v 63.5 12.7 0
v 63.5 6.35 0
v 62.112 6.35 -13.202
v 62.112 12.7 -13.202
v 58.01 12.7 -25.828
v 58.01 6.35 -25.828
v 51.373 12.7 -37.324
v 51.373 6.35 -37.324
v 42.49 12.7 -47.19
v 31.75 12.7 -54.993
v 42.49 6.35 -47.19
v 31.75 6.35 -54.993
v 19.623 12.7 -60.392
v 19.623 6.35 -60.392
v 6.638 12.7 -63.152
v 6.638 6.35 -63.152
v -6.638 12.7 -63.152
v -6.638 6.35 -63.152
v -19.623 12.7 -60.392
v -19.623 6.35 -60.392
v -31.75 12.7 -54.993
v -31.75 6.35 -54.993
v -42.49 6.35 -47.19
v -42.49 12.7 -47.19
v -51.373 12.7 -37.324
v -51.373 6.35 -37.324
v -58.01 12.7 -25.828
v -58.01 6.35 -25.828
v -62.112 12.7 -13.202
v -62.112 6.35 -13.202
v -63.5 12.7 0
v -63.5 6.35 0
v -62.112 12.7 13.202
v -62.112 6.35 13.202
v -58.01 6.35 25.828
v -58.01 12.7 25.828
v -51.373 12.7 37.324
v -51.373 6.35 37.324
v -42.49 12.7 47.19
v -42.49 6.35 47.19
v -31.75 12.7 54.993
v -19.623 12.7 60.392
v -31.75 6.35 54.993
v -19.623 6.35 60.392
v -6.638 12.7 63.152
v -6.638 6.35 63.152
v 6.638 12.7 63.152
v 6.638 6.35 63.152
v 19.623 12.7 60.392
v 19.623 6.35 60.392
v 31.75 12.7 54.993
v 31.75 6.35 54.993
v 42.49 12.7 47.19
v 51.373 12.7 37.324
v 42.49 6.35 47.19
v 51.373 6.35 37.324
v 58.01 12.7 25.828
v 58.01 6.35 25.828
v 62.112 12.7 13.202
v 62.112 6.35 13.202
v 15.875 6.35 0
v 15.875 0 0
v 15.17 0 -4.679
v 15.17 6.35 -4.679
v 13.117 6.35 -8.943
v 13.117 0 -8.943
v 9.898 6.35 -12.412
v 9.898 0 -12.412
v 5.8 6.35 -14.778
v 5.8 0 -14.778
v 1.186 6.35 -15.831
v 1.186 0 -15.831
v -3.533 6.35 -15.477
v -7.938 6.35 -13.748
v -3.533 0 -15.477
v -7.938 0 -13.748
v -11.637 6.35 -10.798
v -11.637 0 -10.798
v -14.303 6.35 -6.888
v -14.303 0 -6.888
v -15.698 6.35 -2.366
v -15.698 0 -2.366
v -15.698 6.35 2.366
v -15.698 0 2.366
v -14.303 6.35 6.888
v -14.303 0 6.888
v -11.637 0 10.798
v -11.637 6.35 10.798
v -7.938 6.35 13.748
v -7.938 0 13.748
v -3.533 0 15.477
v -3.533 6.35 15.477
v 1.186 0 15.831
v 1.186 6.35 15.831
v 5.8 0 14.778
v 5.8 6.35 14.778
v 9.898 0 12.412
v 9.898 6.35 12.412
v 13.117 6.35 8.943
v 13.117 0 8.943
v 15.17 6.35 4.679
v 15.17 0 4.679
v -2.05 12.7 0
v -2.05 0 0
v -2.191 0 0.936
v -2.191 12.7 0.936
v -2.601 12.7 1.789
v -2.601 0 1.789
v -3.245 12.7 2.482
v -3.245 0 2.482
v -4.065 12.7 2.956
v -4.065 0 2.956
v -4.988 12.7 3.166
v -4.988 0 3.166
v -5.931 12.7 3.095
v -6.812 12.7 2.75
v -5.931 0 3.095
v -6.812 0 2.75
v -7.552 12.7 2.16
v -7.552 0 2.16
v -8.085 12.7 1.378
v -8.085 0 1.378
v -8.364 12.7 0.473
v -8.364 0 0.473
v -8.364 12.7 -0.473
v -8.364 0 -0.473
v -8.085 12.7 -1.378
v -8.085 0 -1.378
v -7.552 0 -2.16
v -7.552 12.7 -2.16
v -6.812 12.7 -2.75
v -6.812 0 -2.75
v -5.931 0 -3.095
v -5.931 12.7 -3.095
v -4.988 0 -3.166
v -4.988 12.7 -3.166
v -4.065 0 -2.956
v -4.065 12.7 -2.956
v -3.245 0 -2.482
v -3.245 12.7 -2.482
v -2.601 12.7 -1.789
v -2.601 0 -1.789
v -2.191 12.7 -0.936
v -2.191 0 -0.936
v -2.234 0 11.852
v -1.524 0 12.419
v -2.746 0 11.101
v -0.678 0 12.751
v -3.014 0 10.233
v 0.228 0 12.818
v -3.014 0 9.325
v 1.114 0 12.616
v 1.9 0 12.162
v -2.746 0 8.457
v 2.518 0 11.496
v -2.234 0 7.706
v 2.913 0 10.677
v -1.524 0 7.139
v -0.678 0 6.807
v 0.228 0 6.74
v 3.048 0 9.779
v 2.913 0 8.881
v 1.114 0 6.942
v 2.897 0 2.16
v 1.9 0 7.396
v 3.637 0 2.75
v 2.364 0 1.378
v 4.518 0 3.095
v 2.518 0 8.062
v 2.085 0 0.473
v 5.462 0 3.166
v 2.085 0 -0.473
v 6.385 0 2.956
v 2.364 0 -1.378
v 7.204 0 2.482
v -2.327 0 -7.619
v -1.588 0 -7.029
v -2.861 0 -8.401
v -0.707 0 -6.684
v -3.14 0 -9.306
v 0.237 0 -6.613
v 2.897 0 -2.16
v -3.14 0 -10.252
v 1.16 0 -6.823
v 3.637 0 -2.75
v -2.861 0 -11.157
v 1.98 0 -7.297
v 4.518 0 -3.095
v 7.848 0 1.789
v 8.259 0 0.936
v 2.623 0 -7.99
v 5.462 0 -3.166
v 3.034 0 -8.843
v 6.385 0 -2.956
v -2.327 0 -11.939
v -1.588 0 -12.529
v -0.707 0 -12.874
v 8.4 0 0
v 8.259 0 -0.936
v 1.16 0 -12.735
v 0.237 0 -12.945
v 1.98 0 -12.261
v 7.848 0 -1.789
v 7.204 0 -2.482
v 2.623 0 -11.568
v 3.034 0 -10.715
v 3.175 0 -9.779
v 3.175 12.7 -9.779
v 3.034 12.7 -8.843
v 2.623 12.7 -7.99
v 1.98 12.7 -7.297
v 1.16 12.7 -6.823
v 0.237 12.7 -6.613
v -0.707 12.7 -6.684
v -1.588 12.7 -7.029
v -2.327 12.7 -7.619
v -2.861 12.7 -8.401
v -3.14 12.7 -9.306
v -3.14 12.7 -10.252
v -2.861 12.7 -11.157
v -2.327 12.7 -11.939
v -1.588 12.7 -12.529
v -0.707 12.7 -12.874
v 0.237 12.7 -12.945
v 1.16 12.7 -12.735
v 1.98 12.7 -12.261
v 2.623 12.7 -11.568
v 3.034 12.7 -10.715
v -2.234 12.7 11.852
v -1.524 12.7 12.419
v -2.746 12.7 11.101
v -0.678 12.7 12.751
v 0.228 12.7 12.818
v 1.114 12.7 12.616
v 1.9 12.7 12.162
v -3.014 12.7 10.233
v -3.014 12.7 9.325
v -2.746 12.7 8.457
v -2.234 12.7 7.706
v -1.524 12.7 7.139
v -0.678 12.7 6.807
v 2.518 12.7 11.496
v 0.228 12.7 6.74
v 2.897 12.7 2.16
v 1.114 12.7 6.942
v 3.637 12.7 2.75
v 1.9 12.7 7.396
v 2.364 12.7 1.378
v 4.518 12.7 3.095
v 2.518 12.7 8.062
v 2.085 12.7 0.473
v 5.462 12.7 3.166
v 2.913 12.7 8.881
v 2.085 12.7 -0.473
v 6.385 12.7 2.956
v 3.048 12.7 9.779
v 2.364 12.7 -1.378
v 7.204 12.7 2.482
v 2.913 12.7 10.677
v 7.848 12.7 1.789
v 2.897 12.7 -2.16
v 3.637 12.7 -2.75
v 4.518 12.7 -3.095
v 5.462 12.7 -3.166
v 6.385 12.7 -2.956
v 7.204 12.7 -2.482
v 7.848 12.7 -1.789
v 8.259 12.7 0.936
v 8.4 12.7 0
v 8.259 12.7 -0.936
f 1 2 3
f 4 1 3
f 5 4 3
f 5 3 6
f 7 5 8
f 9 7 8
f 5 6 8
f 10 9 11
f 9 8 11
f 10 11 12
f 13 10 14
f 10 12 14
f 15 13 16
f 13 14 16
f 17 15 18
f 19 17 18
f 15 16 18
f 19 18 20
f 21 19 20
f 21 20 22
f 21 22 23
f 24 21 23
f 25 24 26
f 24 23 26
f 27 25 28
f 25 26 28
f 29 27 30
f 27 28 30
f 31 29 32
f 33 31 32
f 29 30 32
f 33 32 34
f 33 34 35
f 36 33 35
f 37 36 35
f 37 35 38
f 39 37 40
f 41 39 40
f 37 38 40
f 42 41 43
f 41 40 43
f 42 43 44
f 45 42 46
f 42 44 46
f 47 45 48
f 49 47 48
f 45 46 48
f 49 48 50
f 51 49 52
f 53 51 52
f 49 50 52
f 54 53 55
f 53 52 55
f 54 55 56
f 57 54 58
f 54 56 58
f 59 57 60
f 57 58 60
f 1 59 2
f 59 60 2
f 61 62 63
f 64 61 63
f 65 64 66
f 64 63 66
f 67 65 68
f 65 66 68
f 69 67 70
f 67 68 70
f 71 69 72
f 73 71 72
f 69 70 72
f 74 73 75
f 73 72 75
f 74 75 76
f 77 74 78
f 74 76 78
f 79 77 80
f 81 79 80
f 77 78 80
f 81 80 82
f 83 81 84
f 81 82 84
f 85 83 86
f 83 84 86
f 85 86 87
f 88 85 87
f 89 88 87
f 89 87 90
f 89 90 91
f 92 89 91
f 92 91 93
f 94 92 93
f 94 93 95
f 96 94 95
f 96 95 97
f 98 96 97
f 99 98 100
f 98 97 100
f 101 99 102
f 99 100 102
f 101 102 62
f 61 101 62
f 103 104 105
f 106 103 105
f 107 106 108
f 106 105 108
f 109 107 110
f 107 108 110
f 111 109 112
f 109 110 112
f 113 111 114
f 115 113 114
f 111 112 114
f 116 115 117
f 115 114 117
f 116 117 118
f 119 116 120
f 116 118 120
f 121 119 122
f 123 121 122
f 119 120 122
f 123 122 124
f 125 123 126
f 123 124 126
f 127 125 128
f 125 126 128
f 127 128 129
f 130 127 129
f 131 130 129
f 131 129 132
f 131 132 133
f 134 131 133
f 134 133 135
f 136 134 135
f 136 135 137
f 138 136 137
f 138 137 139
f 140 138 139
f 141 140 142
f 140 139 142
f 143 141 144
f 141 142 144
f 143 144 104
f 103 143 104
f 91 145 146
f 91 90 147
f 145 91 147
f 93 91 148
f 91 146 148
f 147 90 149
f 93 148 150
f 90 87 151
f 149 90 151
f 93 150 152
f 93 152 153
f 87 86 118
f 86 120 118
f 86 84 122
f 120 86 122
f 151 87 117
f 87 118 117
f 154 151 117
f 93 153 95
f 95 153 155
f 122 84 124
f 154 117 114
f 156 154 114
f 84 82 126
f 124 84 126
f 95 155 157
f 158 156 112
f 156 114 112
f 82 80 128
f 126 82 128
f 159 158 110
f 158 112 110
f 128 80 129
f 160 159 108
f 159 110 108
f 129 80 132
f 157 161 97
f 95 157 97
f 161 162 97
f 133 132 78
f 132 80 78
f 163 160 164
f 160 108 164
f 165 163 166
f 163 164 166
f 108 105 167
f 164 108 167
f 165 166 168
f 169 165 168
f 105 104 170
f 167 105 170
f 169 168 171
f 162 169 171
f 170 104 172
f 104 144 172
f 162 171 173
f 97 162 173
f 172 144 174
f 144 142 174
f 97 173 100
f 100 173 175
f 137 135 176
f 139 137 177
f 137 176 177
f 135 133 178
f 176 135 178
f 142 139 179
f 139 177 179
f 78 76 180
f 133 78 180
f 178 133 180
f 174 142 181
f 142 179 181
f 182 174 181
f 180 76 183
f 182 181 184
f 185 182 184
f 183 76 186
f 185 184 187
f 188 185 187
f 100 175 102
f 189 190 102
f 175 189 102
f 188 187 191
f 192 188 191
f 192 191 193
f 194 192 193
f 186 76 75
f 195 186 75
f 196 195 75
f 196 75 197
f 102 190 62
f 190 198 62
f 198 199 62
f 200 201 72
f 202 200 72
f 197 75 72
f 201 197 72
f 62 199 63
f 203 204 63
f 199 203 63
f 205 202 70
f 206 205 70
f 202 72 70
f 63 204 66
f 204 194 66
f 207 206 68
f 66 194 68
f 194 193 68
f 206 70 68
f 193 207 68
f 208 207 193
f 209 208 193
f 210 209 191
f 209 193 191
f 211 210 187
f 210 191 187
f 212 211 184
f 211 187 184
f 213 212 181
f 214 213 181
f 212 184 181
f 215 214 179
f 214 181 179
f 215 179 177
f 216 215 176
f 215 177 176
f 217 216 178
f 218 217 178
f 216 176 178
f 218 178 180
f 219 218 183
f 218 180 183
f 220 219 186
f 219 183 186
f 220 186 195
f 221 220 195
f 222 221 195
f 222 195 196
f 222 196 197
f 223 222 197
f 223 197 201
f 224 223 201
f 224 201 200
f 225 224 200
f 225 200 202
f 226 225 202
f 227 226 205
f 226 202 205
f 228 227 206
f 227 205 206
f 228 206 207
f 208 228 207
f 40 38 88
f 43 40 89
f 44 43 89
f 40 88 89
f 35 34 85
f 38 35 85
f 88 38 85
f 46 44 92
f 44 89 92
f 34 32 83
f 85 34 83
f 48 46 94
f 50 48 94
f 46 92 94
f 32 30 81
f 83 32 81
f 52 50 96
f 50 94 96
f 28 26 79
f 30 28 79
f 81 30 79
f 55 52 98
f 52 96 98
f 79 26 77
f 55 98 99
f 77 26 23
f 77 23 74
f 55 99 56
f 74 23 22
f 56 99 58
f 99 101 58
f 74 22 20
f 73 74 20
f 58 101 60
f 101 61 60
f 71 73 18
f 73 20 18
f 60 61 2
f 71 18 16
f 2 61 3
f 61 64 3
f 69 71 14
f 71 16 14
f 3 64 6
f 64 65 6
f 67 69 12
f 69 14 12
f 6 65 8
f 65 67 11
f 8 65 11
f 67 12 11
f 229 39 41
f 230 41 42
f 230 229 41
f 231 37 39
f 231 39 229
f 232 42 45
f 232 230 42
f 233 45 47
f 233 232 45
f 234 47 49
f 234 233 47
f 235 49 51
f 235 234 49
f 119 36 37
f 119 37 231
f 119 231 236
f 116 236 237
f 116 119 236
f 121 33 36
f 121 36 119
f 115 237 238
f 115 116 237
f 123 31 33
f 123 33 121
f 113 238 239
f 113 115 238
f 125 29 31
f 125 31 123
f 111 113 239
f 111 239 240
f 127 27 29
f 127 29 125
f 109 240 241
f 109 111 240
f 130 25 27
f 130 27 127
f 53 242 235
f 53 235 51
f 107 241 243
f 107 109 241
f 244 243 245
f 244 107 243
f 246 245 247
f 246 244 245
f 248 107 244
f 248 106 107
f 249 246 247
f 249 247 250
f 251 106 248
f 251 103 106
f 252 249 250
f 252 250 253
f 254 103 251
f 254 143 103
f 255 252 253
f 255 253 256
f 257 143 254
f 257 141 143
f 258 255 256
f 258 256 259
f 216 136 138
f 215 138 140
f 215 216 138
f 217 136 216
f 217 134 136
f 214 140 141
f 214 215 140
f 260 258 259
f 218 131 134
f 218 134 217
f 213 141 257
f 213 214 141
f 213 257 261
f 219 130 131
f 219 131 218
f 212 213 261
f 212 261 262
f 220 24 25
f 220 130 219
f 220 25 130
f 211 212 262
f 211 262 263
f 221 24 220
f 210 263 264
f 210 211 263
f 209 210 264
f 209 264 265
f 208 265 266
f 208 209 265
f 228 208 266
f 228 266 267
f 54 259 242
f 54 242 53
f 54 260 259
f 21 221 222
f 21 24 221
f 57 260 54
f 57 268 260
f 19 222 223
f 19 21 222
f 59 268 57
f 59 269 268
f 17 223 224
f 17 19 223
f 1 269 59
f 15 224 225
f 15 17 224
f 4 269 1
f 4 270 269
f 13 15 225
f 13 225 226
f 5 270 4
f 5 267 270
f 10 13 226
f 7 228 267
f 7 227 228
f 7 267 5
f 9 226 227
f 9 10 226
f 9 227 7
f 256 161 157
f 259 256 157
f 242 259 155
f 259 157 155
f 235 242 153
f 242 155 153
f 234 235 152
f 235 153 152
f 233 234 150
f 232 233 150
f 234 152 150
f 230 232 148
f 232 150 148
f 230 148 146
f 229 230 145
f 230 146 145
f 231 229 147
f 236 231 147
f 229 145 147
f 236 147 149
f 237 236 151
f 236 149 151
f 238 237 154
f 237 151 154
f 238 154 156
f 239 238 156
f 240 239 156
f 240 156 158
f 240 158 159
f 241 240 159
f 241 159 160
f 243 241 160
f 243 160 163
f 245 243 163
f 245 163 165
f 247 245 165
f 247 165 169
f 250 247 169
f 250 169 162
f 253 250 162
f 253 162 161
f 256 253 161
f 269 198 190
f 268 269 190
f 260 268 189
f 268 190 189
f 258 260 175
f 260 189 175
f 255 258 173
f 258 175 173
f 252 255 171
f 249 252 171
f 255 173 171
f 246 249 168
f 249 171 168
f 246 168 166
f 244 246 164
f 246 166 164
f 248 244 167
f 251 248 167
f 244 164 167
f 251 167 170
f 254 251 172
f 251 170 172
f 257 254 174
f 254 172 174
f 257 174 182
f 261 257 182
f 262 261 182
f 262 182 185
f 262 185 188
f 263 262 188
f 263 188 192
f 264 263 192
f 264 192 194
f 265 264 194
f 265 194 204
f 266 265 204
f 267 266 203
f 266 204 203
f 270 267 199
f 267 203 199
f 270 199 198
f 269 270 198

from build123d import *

# Parameters (mm, degrees)
SKETCH1_R           = 15.875
BOSS_EXTRUDE1_DEPTH = 6.35
SKETCH2_R           = 63.5
BOSS_EXTRUDE2_DEPTH = 6.35
SKETCH9_R           = 3.048
CUT_EXTRUDE1_DEPTH  = 13.7
SKETCH10_R          = 3.175
CUT_EXTRUDE2_DEPTH  = 12.7
SKETCH11_R          = 3.175
CUT_EXTRUDE3_DEPTH  = 12.7
SKETCH12_R          = 3.175
CUT_EXTRUDE4_DEPTH  = 12.7


with BuildPart() as part:
    # Sketch1 → Boss-Extrude1 (new body)
    with BuildSketch(Plane(origin=(0, 0, 0), x_dir=(1, 0, 0), z_dir=(0, 1, 0))):
        Circle(SKETCH1_R)
    extrude(amount=BOSS_EXTRUDE1_DEPTH)

    # Sketch2 → Boss-Extrude2 (add)
    with BuildSketch(Plane(origin=(0, 6.35, 0), x_dir=(1, 0, 0), z_dir=(0, 1, 0))):
        Circle(SKETCH2_R)
    extrude(amount=BOSS_EXTRUDE2_DEPTH)

    # Sketch9 → Cut-Extrude1 (cut, through all)
    with BuildSketch(Plane.XZ):
        with Locations((0, 9.779)):
            Circle(SKETCH9_R)
    extrude(amount=-CUT_EXTRUDE1_DEPTH, mode=Mode.SUBTRACT)

    # Sketch10 → Cut-Extrude2 (cut)
    with BuildSketch(Plane.XZ):
        with Locations((0, -9.779)):
            Circle(SKETCH10_R)
    extrude(amount=-CUT_EXTRUDE2_DEPTH, mode=Mode.SUBTRACT)

    # Sketch11 → Cut-Extrude3 (cut)
    with BuildSketch(Plane.XZ):
        with Locations((-5.22478, 0)):
            Circle(SKETCH11_R)
    extrude(amount=-CUT_EXTRUDE3_DEPTH, mode=Mode.SUBTRACT)

    # Sketch12 → Cut-Extrude4 (cut)
    with BuildSketch(Plane.XZ):
        with Locations((5.22478, 0)):
            Circle(SKETCH12_R)
    extrude(amount=-CUT_EXTRUDE4_DEPTH, mode=Mode.SUBTRACT)


solid = part.part
